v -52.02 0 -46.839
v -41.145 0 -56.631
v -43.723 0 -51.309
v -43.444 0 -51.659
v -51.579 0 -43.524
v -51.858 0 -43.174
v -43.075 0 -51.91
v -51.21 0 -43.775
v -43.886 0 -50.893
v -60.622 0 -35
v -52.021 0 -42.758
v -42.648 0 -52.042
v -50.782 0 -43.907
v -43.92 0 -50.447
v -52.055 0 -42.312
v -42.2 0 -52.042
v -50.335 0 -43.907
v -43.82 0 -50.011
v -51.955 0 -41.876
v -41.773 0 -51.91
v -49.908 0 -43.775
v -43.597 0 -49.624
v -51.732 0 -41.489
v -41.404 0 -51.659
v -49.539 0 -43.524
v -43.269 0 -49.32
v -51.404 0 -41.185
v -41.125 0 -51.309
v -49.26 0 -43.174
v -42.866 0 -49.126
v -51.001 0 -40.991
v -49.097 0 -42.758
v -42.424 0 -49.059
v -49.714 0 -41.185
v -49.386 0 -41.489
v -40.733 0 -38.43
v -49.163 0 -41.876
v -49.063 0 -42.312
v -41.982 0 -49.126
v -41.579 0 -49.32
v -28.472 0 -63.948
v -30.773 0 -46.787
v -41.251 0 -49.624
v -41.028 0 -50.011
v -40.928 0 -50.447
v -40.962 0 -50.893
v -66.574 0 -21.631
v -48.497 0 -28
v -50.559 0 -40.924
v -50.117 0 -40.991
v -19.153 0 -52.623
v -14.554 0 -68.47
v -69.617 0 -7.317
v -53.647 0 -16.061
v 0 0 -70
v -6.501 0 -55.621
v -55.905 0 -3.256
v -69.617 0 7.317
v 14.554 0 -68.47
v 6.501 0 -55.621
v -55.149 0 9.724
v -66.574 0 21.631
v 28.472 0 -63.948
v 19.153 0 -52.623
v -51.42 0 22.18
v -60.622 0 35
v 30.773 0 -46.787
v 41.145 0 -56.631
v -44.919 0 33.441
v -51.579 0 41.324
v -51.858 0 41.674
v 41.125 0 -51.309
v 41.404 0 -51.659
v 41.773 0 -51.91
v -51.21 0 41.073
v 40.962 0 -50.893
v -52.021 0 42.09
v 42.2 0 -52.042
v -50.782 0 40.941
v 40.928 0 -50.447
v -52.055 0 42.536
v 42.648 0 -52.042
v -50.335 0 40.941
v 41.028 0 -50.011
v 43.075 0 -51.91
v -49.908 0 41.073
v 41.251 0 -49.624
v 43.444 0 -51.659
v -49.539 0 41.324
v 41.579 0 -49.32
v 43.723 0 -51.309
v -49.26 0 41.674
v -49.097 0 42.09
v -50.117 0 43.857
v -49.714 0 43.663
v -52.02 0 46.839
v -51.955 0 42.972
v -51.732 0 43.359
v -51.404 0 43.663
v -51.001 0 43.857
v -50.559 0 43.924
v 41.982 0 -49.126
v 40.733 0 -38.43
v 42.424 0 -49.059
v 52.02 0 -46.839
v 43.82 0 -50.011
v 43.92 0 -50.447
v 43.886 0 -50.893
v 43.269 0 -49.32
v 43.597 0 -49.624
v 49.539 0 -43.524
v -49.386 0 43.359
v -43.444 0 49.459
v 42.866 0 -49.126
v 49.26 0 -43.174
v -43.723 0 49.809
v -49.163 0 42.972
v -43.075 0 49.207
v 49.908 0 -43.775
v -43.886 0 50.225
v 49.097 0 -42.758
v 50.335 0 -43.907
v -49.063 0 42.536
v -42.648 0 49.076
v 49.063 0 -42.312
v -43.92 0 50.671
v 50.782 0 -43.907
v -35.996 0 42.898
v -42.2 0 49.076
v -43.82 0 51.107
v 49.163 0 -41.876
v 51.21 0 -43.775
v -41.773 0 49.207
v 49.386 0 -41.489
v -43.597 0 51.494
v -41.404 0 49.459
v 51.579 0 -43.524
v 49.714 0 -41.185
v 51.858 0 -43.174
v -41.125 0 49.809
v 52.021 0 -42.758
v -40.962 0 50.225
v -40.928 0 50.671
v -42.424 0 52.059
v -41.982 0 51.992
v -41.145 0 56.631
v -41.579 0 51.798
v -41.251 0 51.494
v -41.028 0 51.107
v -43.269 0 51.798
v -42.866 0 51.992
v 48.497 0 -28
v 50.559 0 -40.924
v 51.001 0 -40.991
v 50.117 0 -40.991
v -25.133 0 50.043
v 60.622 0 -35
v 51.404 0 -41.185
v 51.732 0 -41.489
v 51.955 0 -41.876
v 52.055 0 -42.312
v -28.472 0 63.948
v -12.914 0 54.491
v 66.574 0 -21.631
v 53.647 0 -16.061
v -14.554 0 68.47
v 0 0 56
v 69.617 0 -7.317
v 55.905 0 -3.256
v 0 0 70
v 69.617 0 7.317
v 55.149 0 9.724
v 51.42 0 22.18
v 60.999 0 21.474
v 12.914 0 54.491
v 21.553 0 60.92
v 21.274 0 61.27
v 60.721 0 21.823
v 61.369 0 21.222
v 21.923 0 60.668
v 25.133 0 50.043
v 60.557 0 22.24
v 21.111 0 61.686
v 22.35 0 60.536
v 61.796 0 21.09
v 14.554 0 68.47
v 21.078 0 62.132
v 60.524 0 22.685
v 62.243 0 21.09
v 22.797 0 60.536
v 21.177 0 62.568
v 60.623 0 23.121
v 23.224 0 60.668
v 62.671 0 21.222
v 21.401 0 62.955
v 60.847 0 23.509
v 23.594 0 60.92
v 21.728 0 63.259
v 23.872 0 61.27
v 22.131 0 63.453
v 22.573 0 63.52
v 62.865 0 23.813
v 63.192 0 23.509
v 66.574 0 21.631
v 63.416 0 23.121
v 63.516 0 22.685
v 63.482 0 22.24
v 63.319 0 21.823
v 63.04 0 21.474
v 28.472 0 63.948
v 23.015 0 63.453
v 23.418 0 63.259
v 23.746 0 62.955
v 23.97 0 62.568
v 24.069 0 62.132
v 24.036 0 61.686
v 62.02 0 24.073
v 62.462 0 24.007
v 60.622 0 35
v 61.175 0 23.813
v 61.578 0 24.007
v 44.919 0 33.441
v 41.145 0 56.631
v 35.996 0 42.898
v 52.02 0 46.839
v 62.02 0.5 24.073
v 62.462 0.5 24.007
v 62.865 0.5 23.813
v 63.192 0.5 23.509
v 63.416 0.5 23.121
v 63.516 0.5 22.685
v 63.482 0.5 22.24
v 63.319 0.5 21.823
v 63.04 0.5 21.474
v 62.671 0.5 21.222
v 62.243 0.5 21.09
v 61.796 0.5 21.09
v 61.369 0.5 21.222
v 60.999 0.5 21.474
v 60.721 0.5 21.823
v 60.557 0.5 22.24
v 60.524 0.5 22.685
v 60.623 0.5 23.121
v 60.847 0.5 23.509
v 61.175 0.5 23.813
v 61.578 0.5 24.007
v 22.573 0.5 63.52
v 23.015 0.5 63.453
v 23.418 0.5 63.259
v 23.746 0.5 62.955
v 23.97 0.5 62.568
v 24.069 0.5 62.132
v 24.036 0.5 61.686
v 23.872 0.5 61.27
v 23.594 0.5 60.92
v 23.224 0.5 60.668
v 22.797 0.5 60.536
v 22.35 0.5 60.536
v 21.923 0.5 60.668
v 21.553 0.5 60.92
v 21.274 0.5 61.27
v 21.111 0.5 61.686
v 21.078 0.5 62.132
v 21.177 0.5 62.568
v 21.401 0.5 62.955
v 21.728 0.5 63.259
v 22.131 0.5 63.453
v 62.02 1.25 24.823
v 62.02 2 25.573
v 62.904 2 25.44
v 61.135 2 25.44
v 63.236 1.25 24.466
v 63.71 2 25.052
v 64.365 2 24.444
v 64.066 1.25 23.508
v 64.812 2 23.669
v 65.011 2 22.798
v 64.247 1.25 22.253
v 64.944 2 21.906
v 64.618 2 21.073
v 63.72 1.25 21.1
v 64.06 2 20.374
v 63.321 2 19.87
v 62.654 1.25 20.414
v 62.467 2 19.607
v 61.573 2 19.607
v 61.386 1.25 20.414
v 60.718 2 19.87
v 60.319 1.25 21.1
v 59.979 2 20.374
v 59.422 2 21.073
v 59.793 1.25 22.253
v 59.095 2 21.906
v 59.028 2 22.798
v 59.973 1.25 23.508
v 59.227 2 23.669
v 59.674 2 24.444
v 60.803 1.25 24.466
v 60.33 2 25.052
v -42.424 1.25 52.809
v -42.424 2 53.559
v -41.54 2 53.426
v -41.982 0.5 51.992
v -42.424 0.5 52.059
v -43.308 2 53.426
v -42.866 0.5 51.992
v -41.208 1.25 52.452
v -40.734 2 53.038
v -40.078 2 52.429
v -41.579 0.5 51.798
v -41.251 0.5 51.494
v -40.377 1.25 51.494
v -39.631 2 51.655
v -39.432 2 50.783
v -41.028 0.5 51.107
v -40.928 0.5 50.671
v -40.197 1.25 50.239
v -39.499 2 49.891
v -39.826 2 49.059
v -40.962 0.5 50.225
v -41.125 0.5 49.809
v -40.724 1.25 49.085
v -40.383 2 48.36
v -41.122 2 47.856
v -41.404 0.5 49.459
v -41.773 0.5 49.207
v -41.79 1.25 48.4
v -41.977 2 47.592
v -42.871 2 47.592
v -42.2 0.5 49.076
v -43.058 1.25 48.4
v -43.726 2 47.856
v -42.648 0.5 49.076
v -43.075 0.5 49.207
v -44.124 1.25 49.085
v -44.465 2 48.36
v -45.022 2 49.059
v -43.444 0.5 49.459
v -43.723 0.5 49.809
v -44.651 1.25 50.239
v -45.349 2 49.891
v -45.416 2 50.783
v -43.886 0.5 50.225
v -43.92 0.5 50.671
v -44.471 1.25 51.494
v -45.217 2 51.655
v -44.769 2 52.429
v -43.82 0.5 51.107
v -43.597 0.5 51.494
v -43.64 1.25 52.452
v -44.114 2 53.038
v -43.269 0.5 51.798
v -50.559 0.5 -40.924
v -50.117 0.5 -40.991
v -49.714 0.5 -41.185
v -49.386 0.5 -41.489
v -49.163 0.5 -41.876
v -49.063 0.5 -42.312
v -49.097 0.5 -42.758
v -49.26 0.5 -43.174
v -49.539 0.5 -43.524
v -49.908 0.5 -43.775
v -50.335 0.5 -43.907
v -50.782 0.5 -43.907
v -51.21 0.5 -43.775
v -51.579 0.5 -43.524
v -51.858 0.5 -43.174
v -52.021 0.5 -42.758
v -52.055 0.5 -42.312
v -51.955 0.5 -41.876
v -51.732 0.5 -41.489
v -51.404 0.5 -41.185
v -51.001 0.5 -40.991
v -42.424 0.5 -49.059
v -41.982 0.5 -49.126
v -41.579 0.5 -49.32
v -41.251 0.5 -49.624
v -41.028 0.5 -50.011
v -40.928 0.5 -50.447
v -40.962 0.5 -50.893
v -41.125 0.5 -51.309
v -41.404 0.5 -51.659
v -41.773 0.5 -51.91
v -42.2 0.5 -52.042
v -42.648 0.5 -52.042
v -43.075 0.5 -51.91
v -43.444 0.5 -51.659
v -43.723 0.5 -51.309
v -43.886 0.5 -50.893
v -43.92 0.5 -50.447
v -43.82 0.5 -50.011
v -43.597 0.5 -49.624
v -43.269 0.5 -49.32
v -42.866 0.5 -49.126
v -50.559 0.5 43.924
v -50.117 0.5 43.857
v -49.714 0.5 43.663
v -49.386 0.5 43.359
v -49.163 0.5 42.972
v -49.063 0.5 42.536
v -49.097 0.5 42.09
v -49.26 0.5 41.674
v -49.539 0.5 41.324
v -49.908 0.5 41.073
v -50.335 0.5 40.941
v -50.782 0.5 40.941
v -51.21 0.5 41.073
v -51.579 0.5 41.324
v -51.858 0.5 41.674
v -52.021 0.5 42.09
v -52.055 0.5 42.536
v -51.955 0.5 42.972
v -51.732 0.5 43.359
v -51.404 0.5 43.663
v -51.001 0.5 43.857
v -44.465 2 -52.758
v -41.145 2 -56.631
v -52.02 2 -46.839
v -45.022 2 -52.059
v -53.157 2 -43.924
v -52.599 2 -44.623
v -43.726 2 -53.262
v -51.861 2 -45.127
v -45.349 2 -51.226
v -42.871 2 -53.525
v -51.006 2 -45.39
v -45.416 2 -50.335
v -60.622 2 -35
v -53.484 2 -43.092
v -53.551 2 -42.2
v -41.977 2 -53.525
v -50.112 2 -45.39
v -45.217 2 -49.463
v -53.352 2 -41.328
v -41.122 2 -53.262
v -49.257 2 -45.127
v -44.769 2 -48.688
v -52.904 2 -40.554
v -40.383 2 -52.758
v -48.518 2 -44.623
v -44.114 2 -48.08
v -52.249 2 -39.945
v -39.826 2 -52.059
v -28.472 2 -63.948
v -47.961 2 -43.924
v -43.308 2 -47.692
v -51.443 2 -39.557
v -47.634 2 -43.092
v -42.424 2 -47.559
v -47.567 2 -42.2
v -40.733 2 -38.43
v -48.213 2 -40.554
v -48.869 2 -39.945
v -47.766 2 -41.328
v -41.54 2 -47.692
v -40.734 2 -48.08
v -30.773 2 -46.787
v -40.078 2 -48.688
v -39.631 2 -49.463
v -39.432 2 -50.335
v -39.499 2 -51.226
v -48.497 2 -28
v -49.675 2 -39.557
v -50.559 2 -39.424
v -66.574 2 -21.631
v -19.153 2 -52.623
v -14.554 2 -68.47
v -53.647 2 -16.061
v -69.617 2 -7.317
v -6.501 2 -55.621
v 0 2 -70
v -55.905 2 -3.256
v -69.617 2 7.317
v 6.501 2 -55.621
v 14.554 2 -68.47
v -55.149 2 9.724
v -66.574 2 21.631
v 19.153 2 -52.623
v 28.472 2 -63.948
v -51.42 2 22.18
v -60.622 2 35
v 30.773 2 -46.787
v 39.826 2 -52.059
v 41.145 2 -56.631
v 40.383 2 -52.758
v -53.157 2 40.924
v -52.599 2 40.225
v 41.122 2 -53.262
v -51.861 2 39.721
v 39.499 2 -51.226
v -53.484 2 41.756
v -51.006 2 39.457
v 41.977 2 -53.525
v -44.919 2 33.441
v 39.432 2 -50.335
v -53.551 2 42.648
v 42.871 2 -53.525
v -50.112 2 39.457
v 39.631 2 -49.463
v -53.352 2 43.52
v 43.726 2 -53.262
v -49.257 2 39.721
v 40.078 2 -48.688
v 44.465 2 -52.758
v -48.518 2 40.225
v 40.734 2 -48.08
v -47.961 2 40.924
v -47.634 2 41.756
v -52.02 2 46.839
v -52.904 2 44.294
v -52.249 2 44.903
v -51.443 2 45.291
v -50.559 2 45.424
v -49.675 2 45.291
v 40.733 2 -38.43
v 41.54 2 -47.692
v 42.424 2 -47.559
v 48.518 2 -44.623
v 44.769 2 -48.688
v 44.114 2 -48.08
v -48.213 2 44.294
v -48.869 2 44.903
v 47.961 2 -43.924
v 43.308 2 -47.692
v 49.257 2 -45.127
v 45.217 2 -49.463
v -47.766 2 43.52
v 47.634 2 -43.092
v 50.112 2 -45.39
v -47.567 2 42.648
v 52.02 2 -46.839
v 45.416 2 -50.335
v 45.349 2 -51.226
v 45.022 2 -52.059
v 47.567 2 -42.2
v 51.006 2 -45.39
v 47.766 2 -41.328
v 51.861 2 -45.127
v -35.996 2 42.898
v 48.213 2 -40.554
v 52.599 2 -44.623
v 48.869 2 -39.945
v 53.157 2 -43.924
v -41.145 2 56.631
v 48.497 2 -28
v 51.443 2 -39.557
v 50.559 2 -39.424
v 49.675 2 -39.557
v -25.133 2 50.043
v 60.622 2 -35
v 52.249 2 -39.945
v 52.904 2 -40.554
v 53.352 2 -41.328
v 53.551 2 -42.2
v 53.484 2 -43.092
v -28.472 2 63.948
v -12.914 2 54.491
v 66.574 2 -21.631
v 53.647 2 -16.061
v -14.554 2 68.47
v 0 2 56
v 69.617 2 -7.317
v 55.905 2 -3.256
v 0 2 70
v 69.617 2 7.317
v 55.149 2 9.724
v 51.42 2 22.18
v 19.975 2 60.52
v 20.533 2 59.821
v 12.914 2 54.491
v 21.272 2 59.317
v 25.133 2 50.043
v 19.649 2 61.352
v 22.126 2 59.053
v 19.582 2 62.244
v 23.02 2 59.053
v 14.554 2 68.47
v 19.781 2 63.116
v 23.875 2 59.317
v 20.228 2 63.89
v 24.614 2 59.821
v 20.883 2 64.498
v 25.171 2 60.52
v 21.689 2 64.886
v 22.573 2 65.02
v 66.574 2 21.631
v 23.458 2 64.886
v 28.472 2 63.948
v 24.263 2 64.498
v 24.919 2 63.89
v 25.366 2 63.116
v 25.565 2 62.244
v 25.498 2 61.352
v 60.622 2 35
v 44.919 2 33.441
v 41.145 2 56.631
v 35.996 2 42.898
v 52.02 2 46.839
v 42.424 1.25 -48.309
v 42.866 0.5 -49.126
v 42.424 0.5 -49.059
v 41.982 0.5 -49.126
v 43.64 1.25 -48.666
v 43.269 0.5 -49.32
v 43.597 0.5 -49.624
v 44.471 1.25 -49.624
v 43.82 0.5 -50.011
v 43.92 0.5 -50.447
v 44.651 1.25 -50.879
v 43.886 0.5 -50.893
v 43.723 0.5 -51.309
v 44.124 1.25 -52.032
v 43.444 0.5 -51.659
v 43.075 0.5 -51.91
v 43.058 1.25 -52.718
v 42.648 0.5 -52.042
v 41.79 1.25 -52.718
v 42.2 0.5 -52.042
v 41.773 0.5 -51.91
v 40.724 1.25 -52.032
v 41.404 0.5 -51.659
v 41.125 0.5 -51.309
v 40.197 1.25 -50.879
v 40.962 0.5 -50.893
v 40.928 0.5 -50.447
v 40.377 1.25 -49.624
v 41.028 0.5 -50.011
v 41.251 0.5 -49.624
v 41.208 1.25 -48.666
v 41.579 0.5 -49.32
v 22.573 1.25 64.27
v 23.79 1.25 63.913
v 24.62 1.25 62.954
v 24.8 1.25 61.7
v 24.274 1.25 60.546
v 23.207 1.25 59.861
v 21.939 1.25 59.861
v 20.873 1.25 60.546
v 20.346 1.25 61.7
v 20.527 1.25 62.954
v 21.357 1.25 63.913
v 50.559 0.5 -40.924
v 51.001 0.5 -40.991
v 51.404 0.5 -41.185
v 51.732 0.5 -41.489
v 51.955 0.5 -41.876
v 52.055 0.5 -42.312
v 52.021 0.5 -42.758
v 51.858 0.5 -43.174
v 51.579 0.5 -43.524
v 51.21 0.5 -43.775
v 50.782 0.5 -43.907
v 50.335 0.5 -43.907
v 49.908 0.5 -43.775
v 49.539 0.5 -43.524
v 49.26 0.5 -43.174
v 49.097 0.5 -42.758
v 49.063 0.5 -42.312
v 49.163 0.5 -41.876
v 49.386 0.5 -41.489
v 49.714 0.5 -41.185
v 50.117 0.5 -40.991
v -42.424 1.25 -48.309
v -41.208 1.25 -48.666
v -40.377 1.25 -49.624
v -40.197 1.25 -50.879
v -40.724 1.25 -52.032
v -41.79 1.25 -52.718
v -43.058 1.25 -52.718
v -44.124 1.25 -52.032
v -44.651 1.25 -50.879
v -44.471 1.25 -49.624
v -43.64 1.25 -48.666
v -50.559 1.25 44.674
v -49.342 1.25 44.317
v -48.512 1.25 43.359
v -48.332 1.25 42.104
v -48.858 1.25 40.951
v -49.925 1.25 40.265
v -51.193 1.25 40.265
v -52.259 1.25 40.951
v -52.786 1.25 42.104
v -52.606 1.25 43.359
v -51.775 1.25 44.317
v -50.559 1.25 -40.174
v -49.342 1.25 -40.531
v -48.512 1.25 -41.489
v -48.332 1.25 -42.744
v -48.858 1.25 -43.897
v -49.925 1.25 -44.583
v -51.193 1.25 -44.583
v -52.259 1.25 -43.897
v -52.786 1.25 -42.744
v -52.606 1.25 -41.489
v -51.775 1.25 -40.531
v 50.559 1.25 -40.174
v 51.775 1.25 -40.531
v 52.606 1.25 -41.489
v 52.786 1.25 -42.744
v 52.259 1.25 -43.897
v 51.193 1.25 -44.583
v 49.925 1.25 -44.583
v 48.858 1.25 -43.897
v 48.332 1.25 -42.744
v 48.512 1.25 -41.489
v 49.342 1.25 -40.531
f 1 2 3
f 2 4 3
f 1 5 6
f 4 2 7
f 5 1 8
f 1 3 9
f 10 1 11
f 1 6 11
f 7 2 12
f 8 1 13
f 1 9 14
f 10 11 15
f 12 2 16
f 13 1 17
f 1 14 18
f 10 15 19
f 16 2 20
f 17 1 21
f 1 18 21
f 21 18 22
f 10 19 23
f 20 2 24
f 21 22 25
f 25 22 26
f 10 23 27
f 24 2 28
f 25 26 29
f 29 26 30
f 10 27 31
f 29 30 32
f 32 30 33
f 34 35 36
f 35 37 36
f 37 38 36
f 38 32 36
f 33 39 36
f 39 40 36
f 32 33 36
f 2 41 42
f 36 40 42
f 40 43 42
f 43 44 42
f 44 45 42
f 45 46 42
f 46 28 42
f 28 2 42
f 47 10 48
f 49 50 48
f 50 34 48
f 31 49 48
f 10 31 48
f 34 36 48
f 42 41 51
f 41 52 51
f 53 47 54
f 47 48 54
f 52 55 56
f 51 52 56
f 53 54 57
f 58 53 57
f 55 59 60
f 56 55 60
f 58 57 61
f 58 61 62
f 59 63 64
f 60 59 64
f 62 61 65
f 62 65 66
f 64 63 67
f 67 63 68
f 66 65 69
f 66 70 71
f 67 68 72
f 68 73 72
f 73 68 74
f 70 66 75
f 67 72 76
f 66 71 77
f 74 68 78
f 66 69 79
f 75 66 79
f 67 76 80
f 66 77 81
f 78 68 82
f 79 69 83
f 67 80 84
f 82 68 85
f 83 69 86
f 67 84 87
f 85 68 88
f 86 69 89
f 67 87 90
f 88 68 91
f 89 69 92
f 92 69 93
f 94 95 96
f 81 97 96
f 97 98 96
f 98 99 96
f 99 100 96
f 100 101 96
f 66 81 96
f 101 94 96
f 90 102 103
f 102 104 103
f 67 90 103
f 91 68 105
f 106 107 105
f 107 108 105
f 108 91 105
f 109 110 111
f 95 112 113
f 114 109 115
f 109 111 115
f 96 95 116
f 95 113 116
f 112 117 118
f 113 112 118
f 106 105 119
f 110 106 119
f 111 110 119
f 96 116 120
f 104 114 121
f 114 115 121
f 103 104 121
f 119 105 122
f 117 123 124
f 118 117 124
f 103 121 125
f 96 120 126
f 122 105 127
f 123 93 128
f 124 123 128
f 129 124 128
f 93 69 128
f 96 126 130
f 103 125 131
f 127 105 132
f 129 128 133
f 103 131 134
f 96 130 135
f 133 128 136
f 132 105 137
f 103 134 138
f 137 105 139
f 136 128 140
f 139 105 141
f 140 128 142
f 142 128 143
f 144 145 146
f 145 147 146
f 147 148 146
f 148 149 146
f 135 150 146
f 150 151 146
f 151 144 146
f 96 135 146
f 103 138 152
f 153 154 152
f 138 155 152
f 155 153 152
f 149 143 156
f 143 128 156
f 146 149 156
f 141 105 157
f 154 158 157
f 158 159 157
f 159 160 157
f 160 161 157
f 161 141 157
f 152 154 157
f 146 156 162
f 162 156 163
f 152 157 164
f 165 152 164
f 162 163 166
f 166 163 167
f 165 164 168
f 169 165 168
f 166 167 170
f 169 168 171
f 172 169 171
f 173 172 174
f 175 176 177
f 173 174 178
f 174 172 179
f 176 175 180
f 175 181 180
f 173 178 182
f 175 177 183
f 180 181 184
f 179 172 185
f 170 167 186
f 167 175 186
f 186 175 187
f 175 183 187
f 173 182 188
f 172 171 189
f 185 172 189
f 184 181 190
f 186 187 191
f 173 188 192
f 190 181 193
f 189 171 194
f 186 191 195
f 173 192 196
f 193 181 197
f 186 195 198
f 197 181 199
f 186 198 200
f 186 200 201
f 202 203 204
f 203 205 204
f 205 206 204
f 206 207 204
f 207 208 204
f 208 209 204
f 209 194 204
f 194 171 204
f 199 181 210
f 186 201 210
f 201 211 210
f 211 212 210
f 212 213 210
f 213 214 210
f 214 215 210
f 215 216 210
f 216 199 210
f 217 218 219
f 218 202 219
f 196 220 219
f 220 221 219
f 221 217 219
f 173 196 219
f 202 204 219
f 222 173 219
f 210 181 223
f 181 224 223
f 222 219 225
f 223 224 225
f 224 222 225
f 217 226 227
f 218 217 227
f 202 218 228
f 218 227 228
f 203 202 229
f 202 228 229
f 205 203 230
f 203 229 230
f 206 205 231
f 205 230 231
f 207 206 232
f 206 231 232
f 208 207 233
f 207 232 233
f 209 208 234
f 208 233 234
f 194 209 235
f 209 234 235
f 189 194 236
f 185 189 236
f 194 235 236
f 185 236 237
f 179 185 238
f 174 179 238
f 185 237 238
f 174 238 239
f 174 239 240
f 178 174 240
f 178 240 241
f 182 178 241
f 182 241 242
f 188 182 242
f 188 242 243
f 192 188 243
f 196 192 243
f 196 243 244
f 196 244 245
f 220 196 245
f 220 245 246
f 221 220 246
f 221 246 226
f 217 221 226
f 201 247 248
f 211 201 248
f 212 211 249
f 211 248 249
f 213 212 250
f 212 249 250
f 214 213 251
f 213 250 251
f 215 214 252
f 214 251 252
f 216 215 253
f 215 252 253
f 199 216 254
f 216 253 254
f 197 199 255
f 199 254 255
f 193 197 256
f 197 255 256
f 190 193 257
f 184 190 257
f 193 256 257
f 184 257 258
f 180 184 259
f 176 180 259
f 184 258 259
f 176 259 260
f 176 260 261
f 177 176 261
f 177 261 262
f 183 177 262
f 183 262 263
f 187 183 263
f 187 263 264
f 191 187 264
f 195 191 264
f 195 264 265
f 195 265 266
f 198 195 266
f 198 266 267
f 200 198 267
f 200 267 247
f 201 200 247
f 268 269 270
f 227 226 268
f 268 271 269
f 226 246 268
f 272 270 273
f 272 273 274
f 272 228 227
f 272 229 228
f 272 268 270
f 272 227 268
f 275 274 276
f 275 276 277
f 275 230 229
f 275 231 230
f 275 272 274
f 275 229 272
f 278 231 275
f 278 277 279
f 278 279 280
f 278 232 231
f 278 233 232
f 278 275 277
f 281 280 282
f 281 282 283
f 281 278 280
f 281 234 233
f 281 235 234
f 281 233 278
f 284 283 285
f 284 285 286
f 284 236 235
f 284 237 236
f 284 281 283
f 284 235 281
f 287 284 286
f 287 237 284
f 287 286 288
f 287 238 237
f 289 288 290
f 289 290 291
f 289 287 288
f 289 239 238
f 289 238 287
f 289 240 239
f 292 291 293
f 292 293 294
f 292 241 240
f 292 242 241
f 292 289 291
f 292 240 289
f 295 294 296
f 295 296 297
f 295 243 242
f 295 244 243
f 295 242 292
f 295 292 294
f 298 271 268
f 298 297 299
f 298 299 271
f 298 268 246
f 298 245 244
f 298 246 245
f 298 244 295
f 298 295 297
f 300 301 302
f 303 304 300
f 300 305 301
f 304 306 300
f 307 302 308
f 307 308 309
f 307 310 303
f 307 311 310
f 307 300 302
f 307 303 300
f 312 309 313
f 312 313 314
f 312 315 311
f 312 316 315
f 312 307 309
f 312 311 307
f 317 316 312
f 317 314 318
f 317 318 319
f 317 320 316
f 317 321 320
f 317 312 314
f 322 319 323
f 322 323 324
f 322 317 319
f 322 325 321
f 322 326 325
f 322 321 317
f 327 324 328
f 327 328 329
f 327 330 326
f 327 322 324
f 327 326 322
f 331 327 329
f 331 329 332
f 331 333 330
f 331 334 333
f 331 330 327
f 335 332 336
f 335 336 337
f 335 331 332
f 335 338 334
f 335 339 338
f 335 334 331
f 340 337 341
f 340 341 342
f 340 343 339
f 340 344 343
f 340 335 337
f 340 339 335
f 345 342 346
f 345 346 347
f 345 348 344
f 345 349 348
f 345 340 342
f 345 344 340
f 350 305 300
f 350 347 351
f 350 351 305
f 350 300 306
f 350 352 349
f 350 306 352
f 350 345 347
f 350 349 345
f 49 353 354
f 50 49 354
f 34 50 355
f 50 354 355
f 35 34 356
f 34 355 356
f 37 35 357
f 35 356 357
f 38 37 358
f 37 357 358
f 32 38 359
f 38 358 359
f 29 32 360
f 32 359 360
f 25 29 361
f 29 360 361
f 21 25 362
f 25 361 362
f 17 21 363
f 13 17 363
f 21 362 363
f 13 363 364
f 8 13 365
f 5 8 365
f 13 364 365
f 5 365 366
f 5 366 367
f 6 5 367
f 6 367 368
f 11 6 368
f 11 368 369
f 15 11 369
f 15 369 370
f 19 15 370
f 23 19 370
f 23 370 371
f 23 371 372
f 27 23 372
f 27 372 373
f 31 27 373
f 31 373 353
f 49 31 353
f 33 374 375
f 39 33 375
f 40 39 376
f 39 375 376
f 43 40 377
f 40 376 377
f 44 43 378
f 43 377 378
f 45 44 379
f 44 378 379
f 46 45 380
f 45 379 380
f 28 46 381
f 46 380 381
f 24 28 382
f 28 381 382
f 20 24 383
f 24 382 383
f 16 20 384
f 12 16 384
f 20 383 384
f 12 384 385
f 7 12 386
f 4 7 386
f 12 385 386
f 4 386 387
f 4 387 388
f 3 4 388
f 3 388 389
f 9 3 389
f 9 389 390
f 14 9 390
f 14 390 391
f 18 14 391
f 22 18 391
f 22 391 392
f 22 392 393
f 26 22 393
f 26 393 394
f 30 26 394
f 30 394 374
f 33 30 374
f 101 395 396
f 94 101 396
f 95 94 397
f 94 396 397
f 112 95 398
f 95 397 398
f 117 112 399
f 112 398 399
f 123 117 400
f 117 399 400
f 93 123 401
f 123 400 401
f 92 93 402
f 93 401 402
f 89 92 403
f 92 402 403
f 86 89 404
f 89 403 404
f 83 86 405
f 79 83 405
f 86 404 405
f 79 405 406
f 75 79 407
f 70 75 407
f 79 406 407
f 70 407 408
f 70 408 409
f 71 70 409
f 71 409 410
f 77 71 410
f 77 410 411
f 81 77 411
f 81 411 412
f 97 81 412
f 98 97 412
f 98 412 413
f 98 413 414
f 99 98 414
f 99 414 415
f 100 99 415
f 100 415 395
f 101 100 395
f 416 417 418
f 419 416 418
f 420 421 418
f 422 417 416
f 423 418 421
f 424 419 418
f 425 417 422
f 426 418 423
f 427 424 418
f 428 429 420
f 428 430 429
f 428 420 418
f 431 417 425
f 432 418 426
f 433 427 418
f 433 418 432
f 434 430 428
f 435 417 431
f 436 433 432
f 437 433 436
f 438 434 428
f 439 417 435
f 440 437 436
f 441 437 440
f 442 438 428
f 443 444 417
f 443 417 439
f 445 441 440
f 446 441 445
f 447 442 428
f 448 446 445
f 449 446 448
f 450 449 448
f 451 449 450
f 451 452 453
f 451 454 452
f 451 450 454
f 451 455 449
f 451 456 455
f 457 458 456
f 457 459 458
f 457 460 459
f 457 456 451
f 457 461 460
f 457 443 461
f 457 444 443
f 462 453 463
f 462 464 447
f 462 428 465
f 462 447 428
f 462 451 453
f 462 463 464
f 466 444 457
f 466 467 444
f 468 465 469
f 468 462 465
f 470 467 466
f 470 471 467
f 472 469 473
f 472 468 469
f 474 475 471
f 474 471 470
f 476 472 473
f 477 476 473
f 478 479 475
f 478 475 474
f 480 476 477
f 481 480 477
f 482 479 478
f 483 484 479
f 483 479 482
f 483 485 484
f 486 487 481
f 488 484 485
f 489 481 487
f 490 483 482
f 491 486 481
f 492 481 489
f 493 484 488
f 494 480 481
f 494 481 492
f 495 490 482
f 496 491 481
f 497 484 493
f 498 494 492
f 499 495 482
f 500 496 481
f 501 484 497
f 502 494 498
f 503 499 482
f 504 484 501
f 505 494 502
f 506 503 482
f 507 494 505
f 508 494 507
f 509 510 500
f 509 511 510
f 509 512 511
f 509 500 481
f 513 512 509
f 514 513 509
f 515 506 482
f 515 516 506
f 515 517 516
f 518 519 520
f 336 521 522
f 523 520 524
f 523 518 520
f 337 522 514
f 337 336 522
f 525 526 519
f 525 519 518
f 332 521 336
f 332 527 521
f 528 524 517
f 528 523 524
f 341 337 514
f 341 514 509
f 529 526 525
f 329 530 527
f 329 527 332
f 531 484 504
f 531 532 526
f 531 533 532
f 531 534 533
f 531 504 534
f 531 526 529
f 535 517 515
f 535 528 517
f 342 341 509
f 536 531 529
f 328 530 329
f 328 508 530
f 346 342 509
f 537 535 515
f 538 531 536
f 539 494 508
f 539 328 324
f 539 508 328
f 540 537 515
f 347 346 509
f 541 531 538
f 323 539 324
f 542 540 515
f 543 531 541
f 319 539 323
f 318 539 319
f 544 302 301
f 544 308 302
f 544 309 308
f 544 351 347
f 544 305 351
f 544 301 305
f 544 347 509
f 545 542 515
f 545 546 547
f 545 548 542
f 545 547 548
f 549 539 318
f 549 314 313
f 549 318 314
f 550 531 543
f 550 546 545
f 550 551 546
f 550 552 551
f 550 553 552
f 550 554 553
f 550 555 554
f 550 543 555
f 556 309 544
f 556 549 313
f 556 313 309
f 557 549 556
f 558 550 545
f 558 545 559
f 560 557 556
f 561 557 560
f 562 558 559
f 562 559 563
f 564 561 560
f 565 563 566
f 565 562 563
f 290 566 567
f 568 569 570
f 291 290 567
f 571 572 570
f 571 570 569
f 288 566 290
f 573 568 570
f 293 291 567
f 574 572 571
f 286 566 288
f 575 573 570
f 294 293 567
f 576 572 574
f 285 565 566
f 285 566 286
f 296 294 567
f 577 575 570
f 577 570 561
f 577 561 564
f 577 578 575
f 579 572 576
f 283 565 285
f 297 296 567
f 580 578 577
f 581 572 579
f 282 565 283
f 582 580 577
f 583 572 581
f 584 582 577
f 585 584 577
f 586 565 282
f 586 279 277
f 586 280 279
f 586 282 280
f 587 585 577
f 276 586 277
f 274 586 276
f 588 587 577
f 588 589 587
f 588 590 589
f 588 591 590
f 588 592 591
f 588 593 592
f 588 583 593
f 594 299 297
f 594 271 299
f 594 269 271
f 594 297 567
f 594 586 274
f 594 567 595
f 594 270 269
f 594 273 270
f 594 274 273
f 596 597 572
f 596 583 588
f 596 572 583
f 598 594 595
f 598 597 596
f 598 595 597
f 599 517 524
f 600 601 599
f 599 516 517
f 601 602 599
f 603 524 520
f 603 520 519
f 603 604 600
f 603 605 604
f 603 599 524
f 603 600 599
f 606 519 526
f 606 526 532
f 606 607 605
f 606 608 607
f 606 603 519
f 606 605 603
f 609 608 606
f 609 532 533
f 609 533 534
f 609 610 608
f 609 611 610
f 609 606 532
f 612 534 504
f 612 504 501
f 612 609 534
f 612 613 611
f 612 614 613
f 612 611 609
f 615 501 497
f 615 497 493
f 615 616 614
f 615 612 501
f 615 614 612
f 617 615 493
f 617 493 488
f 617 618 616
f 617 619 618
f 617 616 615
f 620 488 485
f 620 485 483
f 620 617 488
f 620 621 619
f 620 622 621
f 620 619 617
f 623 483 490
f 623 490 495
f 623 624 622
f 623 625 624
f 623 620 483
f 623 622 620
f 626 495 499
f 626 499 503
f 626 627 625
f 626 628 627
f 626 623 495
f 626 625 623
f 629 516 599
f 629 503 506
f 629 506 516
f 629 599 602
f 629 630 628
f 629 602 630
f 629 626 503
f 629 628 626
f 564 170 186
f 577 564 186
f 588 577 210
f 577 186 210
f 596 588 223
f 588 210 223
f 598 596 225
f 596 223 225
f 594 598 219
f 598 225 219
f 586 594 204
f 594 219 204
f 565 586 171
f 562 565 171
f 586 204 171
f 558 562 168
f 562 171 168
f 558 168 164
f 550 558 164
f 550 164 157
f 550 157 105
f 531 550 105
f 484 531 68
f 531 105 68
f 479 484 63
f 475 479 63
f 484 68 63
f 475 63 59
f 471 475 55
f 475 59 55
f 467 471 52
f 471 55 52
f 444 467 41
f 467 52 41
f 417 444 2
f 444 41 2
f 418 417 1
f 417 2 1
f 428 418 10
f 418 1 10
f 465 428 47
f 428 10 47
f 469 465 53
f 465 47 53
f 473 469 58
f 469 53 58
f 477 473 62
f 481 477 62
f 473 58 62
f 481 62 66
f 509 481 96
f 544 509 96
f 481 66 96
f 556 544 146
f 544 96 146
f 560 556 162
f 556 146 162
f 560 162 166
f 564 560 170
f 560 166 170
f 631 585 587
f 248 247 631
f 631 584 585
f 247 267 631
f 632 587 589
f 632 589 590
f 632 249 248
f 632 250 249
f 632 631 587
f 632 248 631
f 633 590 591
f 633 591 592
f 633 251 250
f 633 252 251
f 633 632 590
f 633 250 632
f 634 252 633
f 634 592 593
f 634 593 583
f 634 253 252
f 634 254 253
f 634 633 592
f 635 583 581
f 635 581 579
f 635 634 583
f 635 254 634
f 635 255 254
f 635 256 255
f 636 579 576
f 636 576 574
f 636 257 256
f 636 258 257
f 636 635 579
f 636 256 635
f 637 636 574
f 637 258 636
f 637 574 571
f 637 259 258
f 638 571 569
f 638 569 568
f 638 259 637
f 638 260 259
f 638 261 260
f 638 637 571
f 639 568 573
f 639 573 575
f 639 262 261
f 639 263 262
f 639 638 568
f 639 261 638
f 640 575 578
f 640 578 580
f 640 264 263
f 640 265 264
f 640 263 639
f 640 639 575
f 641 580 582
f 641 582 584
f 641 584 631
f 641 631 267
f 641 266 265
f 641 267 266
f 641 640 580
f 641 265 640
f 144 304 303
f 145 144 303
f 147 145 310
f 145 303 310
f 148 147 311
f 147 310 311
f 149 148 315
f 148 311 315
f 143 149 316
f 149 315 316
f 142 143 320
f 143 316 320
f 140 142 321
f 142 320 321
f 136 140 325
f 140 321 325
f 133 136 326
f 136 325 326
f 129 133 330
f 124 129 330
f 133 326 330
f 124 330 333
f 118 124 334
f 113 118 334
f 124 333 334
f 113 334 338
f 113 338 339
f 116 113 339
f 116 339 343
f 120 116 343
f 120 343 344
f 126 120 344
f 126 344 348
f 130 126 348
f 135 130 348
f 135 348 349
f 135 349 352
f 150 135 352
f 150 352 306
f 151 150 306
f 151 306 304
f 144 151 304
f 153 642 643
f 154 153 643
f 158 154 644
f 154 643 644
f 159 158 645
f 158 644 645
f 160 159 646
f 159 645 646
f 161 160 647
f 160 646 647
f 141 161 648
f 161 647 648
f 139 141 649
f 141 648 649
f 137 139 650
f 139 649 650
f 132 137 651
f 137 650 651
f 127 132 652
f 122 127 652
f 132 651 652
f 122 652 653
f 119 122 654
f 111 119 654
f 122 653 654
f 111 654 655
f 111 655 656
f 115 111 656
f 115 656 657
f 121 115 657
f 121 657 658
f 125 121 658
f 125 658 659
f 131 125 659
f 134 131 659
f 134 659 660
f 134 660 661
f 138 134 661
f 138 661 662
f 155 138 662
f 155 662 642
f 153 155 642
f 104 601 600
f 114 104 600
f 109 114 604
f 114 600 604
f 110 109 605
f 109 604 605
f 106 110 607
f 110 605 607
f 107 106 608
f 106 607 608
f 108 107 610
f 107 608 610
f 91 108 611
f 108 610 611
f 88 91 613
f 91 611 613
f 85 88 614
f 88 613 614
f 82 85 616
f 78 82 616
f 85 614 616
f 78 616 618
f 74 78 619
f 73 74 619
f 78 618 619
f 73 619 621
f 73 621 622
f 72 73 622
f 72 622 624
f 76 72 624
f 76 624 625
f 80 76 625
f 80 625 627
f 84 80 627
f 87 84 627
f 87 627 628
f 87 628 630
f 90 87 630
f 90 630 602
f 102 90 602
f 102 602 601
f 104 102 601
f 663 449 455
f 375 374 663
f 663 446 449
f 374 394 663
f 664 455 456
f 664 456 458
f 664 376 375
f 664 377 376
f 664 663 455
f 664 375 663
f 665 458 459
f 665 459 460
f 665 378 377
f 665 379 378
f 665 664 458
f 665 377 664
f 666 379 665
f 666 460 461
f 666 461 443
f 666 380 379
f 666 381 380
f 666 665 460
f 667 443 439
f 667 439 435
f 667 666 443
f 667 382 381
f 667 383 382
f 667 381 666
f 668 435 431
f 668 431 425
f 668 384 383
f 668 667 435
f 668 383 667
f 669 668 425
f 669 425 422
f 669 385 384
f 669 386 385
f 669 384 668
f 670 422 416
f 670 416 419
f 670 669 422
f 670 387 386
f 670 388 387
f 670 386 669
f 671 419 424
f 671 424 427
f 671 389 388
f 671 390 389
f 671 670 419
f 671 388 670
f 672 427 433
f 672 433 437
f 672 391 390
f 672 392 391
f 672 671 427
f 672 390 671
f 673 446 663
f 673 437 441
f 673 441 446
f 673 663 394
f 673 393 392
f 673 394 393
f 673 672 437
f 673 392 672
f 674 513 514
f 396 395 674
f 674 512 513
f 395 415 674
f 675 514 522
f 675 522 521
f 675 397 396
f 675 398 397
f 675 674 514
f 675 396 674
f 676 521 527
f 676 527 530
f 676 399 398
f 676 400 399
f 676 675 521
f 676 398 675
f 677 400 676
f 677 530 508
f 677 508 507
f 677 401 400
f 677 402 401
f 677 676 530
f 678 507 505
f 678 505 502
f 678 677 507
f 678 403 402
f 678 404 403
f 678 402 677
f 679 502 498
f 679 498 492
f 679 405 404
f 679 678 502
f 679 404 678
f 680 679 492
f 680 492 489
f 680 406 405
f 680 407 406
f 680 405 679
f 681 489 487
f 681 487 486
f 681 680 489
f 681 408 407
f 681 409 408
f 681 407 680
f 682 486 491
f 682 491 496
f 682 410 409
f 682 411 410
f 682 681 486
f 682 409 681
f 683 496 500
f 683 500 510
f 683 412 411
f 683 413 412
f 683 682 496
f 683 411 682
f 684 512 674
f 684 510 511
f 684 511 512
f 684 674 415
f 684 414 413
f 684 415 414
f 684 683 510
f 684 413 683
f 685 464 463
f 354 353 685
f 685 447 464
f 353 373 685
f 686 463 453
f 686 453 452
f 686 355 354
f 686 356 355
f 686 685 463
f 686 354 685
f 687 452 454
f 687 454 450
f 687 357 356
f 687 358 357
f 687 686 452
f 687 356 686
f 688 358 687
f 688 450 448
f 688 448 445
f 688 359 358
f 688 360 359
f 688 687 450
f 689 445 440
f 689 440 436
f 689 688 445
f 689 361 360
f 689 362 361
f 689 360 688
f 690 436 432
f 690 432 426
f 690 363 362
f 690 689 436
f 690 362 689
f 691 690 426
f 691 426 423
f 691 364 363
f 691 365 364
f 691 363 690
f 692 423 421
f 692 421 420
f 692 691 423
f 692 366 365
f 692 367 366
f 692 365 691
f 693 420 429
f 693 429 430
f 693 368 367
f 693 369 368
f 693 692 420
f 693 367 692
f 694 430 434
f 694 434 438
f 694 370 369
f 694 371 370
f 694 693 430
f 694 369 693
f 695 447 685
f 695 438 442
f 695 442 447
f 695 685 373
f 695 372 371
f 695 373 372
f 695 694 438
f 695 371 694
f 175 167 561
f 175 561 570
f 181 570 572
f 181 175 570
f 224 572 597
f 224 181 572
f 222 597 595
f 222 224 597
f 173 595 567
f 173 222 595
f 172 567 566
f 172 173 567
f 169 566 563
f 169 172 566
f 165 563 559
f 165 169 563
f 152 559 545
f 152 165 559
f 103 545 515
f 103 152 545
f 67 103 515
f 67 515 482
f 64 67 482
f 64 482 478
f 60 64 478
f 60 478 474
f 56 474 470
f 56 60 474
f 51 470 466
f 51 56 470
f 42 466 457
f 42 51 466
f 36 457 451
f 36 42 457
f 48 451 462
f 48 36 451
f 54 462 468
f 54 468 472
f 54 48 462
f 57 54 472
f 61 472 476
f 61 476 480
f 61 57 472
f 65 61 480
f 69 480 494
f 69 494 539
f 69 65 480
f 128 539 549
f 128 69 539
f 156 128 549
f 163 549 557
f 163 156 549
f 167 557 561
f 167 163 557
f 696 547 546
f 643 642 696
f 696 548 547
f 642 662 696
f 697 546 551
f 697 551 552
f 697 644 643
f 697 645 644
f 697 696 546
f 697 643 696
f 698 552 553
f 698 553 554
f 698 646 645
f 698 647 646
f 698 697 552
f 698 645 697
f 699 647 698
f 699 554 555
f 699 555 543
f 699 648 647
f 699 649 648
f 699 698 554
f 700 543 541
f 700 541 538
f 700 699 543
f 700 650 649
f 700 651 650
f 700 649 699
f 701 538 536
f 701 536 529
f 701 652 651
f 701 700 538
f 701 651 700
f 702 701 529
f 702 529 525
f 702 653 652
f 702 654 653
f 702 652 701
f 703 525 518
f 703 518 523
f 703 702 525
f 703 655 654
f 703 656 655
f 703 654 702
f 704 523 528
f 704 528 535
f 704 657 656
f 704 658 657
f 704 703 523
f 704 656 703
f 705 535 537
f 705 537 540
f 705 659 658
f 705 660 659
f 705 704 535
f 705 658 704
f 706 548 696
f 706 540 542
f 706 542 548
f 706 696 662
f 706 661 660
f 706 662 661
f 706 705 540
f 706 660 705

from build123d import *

# Parameters (mm, degrees)
SKETCH_1_R          = 70
SKETCH_1_R_2        = 56
EXTRUDE_1_DEPTH     = 2
SKETCH_2_R          = 1.5
CUT_EXTRUDE_1_DEPTH = 3
CHAMFER_1_SIZE      = 1.5


with BuildPart() as part:
    # 草图1 → 凸台-拉伸1 (new body)
    with BuildSketch(Plane(origin=(0, 0, 0), x_dir=(1, 0, 0), z_dir=(0, 1, 0))):
        with Locations(Location((0, 0, 0), (0, 0, 270))):
            Circle(SKETCH_1_R)
        with Locations(Location((0, 0, 0), (0, 0, 270))):
            Circle(SKETCH_1_R_2, mode=Mode.SUBTRACT)
    extrude(amount=EXTRUDE_1_DEPTH)

    # 草图2 → 切除-拉伸1 (cut)
    with BuildSketch(Plane(origin=(0, 2, 0), x_dir=(1, 0, 0), z_dir=(0, 1, 0))):
        with Locations(Location((42.423982239, 50.558933246, 0), (0, 0, 270))):
            Circle(SKETCH_2_R)
        with Locations(Location((50.558933246, 42.423982239, 0), (0, 0, 270))):
            Circle(SKETCH_2_R)
        with Locations(Location((-50.558933246, 42.423982239, 0), (0, 0, 270))):
            Circle(SKETCH_2_R)
        with Locations(Location((-42.423982239, 50.558933246, 0), (0, 0, 270))):
            Circle(SKETCH_2_R)
        with Locations(Location((-50.558933246, -42.423982239, 0), (0, 0, 270))):
            Circle(SKETCH_2_R)
        with Locations(Location((-42.423982239, -50.558933246, 0), (0, 0, 270))):
            Circle(SKETCH_2_R)
        with Locations(Location((22.573329459, -62.019712972, 0), (0, 0, 270))):
            Circle(SKETCH_2_R)
        with Locations(Location((62.019712972, -22.573329459, 0), (0, 0, 270))):
            Circle(SKETCH_2_R)
    extrude(amount=-CUT_EXTRUDE_1_DEPTH, mode=Mode.SUBTRACT)

    # 倒角1
    chamfer_1_edges = [part.edges().sort_by_distance(p)[0] for p in [
        (50.558933246, 2, -43.923982239),
        (22.573329459, 2, 60.519712972),
        (-50.558933246, 2, -43.923982239),
        (-42.423982239, 2, -52.058933246),
        (-50.558933246, 2, 40.923982239),
        (-42.423982239, 2, 49.058933246),
        (62.019712972, 2, 21.073329459),
        (42.423982239, 2, -52.058933246),
    ]]
    chamfer(chamfer_1_edges, length=CHAMFER_1_SIZE)


solid = part.part
